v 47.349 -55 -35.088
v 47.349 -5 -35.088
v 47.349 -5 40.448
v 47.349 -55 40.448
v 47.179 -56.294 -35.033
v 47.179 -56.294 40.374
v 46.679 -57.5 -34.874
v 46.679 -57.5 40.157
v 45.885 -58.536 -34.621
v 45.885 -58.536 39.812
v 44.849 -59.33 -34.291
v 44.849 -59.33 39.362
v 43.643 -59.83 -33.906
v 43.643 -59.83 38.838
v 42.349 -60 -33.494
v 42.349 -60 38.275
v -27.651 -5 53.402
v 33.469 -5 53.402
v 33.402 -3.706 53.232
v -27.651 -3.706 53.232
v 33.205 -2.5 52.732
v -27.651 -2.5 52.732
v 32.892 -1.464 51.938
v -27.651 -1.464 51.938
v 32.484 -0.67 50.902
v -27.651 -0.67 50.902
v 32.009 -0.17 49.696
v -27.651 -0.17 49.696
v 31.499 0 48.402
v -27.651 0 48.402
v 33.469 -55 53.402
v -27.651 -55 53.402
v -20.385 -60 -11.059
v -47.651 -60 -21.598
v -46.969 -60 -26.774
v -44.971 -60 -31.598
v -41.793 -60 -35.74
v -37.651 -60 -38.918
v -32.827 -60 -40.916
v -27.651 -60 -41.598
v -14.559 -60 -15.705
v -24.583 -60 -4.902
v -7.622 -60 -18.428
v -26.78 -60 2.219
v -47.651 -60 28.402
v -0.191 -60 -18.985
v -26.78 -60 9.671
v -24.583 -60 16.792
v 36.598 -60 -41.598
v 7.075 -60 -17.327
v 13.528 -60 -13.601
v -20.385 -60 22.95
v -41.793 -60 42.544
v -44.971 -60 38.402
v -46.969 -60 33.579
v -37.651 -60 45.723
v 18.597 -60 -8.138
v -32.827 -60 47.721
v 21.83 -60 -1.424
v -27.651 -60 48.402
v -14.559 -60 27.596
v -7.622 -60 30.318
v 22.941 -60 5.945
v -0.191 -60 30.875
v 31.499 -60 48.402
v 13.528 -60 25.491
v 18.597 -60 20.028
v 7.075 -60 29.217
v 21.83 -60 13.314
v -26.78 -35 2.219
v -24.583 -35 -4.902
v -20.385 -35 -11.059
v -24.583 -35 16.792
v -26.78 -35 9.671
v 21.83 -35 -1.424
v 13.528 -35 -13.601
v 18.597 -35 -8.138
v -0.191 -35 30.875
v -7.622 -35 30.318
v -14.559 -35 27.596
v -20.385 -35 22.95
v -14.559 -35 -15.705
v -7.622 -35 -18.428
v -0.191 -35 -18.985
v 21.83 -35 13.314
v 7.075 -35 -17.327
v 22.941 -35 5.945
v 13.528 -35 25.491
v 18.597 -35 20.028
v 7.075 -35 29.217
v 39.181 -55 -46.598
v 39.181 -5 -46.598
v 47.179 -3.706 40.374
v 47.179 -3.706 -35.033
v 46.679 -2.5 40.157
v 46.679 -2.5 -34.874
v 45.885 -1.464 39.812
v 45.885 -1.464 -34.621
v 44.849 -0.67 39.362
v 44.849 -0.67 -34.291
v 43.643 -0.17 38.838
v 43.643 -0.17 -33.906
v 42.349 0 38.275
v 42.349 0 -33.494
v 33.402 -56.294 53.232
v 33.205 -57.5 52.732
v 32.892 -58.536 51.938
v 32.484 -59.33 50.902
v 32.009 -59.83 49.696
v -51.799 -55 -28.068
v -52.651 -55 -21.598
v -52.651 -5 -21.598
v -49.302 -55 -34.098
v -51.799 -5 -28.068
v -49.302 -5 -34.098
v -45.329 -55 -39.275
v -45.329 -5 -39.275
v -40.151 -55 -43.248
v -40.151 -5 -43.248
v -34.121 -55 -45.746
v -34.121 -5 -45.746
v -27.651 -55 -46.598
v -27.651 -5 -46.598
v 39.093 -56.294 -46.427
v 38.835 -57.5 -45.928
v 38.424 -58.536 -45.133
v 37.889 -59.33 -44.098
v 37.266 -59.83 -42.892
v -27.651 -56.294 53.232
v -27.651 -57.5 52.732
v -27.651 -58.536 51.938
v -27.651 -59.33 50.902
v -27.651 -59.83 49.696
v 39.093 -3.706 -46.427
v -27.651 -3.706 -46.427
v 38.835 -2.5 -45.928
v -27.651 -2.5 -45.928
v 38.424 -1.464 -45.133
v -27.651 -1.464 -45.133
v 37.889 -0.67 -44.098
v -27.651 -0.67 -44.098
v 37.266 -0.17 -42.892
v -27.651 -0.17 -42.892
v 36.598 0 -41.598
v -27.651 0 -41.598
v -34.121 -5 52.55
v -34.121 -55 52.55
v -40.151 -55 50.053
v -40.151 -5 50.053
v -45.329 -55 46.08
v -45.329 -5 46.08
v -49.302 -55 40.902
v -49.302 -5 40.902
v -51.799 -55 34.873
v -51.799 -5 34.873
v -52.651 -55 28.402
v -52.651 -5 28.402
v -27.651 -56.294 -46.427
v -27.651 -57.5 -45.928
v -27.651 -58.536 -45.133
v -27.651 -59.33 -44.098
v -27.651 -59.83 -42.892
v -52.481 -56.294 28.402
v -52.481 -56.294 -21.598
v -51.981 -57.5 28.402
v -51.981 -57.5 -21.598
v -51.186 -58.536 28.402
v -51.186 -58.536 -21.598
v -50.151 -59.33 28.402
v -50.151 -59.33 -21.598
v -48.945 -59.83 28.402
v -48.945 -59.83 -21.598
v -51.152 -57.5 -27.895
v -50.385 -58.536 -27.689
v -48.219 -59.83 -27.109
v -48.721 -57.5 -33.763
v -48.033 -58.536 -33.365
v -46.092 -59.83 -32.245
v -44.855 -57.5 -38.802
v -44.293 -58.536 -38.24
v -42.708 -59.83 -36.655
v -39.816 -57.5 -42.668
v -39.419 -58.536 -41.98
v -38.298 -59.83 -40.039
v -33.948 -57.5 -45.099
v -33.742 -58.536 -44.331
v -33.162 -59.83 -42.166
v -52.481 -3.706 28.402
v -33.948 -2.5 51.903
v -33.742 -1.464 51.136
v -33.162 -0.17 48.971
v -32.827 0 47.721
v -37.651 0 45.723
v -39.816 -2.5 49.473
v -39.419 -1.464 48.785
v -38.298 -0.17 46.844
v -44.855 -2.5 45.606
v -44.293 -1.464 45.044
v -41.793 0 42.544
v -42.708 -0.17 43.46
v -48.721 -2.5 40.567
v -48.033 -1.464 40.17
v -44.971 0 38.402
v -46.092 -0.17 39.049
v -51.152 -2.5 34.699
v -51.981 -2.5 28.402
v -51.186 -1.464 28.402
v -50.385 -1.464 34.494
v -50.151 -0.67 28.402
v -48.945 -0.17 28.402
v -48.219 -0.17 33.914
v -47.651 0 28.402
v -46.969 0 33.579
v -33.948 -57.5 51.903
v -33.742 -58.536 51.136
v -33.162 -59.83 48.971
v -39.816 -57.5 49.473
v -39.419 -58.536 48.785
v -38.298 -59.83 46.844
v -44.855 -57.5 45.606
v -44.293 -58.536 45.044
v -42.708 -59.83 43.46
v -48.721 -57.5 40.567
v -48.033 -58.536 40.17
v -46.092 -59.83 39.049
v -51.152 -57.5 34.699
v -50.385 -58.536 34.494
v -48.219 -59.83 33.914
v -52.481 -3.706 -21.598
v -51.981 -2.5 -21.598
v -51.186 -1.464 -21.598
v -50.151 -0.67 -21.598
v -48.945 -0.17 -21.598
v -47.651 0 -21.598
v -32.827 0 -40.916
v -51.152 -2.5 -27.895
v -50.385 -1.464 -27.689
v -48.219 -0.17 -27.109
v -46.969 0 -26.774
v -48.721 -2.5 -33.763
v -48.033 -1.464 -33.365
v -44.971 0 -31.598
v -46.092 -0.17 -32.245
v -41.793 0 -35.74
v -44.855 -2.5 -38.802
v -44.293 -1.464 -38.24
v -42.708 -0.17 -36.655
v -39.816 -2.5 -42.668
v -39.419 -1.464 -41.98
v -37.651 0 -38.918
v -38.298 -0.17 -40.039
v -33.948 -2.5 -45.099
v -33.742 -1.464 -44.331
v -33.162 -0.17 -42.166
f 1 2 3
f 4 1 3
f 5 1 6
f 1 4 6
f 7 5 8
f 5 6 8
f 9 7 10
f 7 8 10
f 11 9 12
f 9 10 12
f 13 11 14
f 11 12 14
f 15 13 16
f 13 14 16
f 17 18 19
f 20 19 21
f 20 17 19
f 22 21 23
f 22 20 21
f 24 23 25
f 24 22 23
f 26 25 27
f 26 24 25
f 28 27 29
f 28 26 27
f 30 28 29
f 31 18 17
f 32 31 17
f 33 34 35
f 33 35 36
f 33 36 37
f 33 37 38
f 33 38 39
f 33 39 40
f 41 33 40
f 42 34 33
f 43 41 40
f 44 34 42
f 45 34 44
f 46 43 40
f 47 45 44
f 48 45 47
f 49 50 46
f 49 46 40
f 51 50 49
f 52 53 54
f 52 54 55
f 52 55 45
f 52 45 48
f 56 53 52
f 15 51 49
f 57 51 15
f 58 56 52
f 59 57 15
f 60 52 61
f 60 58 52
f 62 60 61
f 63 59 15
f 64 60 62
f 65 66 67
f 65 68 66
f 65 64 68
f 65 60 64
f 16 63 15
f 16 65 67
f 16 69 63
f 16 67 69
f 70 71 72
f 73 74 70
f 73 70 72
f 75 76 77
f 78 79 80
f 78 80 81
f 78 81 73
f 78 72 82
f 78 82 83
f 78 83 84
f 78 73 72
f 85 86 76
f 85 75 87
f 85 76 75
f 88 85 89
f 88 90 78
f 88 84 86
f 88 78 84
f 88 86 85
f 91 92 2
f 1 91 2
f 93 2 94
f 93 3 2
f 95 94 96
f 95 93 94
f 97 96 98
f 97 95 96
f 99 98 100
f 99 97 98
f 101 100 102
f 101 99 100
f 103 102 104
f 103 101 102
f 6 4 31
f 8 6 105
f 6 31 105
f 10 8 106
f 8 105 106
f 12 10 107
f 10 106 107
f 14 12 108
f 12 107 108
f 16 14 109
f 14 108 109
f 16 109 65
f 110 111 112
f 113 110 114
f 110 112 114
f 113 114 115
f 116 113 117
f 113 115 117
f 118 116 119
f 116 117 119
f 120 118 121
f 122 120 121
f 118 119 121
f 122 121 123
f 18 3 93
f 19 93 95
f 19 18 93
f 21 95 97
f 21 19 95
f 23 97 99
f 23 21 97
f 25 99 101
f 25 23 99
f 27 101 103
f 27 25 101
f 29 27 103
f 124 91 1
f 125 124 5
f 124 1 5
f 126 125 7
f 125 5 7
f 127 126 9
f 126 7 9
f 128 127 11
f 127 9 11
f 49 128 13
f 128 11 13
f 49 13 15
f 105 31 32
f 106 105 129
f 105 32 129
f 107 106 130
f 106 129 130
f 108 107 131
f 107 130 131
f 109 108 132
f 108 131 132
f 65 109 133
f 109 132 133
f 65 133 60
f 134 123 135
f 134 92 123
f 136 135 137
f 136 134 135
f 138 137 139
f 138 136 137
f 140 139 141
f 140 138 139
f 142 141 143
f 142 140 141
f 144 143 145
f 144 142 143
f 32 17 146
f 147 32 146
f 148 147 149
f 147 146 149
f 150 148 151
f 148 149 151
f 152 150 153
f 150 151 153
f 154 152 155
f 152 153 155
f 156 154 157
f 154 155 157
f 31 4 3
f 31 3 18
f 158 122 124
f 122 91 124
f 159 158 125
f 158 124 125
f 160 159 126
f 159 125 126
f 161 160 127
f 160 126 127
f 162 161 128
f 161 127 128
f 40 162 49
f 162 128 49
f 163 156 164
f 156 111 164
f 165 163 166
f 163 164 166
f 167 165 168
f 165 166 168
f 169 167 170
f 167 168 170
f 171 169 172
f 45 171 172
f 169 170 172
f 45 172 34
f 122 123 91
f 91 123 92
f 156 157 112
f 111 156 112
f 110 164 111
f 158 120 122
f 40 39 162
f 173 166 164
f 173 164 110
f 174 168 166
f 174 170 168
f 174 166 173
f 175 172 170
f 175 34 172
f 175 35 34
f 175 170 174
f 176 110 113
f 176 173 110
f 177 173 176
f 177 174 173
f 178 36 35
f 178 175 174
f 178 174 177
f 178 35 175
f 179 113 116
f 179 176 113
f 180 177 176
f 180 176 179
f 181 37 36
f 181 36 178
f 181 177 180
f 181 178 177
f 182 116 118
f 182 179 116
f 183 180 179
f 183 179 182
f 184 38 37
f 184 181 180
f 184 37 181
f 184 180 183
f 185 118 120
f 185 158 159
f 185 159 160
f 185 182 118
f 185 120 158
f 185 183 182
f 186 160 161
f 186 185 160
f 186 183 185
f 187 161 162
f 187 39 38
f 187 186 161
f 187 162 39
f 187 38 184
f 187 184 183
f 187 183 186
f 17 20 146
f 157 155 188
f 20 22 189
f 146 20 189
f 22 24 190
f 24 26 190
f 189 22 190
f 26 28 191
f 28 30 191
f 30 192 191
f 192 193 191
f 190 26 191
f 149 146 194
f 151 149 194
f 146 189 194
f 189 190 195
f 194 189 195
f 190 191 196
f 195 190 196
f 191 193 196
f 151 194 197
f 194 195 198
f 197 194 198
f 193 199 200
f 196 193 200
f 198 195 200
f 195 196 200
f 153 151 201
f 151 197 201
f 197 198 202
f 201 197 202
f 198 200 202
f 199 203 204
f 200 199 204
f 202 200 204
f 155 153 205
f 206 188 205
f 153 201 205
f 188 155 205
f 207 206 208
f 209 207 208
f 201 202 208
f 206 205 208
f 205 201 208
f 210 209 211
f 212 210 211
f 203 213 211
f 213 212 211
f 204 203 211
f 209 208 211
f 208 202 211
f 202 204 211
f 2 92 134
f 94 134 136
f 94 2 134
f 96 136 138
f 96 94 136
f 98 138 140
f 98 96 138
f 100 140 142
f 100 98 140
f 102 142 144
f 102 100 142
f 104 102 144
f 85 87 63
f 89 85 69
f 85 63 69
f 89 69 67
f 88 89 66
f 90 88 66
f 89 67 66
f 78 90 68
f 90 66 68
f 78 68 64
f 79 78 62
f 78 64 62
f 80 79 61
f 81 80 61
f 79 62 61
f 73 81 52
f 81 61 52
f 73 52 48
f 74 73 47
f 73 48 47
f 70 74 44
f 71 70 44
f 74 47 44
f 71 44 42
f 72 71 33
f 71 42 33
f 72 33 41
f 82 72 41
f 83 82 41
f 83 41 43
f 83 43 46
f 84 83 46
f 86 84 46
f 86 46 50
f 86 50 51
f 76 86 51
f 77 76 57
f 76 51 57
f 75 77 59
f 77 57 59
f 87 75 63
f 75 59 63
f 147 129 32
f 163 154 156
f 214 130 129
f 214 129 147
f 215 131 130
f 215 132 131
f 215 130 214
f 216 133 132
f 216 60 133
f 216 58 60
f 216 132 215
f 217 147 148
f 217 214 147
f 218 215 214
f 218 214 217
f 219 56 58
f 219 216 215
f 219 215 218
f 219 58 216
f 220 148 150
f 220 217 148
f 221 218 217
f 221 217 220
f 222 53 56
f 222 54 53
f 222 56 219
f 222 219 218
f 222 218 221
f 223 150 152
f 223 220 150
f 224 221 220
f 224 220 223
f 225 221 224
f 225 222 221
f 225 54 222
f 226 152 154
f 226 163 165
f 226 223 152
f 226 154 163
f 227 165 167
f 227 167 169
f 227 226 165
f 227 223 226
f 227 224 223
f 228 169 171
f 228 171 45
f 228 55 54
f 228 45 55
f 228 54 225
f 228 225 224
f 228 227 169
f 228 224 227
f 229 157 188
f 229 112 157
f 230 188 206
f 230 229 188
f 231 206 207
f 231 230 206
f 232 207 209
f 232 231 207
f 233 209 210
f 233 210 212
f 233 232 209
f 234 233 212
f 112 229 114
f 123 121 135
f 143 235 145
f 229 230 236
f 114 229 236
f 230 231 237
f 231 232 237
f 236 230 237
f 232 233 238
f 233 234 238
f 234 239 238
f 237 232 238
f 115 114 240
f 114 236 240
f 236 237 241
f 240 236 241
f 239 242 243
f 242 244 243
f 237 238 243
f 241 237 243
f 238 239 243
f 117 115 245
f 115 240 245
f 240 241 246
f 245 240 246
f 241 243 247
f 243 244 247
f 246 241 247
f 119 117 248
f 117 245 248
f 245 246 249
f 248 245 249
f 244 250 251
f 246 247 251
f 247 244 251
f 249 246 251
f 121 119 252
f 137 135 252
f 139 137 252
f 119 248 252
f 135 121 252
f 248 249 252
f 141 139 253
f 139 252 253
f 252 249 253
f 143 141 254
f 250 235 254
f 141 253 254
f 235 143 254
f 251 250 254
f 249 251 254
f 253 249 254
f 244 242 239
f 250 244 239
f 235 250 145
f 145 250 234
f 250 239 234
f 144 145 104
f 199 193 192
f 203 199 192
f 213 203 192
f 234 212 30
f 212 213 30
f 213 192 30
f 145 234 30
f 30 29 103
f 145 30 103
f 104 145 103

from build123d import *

# Parameters (mm, degrees)
F1_DEPTH = 60
F2_R     = 5
F3_R     = 25
F4_DEPTH = 25


with BuildPart() as f1:
    # F0 (on Front) → F1 (new body)
    with BuildSketch(Plane.XZ):
        with BuildLine():
            Line((33.469399, 53.402335), (-27.650935, 53.402335))
            ThreePointArc((-27.650935, 53.402335), (-45.328605, 46.080005), (-52.650935, 28.402335))
            Line((-52.650935, 28.402335), (-52.650935, -21.597665))
            ThreePointArc((-52.650935, -21.597665), (-45.328605, -39.275334), (-27.650935, -46.597665))
            Line((-27.650935, -46.597665), (39.180679, -46.597665))
            Line((39.180679, -46.597665), (47.349065, -35.087663))
            Line((47.349065, -35.087663), (47.349065, 40.44798))
            Line((47.349065, 40.44798), (33.469399, 53.402335))
        make_face()
    extrude(amount=F1_DEPTH)

    # F2
    f2_edges = [f1.edges().sort_by_distance(p)[0] for p in [
        (40.409232, -60, 46.925158),
        (2.909232, -60, 53.402335),
        (-45.328605, -60, 46.080005),
        (-52.650935, -60, 3.402335),
        (-45.328605, -60, -39.275334),
        (5.764872, -60, -46.597665),
        (43.264872, -60, -40.842664),
        (47.349065, -60, 2.680159),
        (40.409232, 0, 46.925158),
        (2.909232, 0, 53.402335),
        (-45.328605, 0, 46.080005),
        (-52.650935, 0, 3.402335),
        (-45.328605, 0, -39.275334),
        (5.764872, 0, -46.597665),
        (43.264872, 0, -40.842664),
        (47.349065, 0, 2.680159),
    ]]
    fillet(f2_edges, radius=F2_R)

    # F3 (on face) → F4 (cut)
    with BuildSketch(Plane.XZ.offset(60)):
        with Locations((-2.058923, 5.945201)):
            Circle(F3_R)
    extrude(amount=-F4_DEPTH, mode=Mode.SUBTRACT)


solid = f1.part
